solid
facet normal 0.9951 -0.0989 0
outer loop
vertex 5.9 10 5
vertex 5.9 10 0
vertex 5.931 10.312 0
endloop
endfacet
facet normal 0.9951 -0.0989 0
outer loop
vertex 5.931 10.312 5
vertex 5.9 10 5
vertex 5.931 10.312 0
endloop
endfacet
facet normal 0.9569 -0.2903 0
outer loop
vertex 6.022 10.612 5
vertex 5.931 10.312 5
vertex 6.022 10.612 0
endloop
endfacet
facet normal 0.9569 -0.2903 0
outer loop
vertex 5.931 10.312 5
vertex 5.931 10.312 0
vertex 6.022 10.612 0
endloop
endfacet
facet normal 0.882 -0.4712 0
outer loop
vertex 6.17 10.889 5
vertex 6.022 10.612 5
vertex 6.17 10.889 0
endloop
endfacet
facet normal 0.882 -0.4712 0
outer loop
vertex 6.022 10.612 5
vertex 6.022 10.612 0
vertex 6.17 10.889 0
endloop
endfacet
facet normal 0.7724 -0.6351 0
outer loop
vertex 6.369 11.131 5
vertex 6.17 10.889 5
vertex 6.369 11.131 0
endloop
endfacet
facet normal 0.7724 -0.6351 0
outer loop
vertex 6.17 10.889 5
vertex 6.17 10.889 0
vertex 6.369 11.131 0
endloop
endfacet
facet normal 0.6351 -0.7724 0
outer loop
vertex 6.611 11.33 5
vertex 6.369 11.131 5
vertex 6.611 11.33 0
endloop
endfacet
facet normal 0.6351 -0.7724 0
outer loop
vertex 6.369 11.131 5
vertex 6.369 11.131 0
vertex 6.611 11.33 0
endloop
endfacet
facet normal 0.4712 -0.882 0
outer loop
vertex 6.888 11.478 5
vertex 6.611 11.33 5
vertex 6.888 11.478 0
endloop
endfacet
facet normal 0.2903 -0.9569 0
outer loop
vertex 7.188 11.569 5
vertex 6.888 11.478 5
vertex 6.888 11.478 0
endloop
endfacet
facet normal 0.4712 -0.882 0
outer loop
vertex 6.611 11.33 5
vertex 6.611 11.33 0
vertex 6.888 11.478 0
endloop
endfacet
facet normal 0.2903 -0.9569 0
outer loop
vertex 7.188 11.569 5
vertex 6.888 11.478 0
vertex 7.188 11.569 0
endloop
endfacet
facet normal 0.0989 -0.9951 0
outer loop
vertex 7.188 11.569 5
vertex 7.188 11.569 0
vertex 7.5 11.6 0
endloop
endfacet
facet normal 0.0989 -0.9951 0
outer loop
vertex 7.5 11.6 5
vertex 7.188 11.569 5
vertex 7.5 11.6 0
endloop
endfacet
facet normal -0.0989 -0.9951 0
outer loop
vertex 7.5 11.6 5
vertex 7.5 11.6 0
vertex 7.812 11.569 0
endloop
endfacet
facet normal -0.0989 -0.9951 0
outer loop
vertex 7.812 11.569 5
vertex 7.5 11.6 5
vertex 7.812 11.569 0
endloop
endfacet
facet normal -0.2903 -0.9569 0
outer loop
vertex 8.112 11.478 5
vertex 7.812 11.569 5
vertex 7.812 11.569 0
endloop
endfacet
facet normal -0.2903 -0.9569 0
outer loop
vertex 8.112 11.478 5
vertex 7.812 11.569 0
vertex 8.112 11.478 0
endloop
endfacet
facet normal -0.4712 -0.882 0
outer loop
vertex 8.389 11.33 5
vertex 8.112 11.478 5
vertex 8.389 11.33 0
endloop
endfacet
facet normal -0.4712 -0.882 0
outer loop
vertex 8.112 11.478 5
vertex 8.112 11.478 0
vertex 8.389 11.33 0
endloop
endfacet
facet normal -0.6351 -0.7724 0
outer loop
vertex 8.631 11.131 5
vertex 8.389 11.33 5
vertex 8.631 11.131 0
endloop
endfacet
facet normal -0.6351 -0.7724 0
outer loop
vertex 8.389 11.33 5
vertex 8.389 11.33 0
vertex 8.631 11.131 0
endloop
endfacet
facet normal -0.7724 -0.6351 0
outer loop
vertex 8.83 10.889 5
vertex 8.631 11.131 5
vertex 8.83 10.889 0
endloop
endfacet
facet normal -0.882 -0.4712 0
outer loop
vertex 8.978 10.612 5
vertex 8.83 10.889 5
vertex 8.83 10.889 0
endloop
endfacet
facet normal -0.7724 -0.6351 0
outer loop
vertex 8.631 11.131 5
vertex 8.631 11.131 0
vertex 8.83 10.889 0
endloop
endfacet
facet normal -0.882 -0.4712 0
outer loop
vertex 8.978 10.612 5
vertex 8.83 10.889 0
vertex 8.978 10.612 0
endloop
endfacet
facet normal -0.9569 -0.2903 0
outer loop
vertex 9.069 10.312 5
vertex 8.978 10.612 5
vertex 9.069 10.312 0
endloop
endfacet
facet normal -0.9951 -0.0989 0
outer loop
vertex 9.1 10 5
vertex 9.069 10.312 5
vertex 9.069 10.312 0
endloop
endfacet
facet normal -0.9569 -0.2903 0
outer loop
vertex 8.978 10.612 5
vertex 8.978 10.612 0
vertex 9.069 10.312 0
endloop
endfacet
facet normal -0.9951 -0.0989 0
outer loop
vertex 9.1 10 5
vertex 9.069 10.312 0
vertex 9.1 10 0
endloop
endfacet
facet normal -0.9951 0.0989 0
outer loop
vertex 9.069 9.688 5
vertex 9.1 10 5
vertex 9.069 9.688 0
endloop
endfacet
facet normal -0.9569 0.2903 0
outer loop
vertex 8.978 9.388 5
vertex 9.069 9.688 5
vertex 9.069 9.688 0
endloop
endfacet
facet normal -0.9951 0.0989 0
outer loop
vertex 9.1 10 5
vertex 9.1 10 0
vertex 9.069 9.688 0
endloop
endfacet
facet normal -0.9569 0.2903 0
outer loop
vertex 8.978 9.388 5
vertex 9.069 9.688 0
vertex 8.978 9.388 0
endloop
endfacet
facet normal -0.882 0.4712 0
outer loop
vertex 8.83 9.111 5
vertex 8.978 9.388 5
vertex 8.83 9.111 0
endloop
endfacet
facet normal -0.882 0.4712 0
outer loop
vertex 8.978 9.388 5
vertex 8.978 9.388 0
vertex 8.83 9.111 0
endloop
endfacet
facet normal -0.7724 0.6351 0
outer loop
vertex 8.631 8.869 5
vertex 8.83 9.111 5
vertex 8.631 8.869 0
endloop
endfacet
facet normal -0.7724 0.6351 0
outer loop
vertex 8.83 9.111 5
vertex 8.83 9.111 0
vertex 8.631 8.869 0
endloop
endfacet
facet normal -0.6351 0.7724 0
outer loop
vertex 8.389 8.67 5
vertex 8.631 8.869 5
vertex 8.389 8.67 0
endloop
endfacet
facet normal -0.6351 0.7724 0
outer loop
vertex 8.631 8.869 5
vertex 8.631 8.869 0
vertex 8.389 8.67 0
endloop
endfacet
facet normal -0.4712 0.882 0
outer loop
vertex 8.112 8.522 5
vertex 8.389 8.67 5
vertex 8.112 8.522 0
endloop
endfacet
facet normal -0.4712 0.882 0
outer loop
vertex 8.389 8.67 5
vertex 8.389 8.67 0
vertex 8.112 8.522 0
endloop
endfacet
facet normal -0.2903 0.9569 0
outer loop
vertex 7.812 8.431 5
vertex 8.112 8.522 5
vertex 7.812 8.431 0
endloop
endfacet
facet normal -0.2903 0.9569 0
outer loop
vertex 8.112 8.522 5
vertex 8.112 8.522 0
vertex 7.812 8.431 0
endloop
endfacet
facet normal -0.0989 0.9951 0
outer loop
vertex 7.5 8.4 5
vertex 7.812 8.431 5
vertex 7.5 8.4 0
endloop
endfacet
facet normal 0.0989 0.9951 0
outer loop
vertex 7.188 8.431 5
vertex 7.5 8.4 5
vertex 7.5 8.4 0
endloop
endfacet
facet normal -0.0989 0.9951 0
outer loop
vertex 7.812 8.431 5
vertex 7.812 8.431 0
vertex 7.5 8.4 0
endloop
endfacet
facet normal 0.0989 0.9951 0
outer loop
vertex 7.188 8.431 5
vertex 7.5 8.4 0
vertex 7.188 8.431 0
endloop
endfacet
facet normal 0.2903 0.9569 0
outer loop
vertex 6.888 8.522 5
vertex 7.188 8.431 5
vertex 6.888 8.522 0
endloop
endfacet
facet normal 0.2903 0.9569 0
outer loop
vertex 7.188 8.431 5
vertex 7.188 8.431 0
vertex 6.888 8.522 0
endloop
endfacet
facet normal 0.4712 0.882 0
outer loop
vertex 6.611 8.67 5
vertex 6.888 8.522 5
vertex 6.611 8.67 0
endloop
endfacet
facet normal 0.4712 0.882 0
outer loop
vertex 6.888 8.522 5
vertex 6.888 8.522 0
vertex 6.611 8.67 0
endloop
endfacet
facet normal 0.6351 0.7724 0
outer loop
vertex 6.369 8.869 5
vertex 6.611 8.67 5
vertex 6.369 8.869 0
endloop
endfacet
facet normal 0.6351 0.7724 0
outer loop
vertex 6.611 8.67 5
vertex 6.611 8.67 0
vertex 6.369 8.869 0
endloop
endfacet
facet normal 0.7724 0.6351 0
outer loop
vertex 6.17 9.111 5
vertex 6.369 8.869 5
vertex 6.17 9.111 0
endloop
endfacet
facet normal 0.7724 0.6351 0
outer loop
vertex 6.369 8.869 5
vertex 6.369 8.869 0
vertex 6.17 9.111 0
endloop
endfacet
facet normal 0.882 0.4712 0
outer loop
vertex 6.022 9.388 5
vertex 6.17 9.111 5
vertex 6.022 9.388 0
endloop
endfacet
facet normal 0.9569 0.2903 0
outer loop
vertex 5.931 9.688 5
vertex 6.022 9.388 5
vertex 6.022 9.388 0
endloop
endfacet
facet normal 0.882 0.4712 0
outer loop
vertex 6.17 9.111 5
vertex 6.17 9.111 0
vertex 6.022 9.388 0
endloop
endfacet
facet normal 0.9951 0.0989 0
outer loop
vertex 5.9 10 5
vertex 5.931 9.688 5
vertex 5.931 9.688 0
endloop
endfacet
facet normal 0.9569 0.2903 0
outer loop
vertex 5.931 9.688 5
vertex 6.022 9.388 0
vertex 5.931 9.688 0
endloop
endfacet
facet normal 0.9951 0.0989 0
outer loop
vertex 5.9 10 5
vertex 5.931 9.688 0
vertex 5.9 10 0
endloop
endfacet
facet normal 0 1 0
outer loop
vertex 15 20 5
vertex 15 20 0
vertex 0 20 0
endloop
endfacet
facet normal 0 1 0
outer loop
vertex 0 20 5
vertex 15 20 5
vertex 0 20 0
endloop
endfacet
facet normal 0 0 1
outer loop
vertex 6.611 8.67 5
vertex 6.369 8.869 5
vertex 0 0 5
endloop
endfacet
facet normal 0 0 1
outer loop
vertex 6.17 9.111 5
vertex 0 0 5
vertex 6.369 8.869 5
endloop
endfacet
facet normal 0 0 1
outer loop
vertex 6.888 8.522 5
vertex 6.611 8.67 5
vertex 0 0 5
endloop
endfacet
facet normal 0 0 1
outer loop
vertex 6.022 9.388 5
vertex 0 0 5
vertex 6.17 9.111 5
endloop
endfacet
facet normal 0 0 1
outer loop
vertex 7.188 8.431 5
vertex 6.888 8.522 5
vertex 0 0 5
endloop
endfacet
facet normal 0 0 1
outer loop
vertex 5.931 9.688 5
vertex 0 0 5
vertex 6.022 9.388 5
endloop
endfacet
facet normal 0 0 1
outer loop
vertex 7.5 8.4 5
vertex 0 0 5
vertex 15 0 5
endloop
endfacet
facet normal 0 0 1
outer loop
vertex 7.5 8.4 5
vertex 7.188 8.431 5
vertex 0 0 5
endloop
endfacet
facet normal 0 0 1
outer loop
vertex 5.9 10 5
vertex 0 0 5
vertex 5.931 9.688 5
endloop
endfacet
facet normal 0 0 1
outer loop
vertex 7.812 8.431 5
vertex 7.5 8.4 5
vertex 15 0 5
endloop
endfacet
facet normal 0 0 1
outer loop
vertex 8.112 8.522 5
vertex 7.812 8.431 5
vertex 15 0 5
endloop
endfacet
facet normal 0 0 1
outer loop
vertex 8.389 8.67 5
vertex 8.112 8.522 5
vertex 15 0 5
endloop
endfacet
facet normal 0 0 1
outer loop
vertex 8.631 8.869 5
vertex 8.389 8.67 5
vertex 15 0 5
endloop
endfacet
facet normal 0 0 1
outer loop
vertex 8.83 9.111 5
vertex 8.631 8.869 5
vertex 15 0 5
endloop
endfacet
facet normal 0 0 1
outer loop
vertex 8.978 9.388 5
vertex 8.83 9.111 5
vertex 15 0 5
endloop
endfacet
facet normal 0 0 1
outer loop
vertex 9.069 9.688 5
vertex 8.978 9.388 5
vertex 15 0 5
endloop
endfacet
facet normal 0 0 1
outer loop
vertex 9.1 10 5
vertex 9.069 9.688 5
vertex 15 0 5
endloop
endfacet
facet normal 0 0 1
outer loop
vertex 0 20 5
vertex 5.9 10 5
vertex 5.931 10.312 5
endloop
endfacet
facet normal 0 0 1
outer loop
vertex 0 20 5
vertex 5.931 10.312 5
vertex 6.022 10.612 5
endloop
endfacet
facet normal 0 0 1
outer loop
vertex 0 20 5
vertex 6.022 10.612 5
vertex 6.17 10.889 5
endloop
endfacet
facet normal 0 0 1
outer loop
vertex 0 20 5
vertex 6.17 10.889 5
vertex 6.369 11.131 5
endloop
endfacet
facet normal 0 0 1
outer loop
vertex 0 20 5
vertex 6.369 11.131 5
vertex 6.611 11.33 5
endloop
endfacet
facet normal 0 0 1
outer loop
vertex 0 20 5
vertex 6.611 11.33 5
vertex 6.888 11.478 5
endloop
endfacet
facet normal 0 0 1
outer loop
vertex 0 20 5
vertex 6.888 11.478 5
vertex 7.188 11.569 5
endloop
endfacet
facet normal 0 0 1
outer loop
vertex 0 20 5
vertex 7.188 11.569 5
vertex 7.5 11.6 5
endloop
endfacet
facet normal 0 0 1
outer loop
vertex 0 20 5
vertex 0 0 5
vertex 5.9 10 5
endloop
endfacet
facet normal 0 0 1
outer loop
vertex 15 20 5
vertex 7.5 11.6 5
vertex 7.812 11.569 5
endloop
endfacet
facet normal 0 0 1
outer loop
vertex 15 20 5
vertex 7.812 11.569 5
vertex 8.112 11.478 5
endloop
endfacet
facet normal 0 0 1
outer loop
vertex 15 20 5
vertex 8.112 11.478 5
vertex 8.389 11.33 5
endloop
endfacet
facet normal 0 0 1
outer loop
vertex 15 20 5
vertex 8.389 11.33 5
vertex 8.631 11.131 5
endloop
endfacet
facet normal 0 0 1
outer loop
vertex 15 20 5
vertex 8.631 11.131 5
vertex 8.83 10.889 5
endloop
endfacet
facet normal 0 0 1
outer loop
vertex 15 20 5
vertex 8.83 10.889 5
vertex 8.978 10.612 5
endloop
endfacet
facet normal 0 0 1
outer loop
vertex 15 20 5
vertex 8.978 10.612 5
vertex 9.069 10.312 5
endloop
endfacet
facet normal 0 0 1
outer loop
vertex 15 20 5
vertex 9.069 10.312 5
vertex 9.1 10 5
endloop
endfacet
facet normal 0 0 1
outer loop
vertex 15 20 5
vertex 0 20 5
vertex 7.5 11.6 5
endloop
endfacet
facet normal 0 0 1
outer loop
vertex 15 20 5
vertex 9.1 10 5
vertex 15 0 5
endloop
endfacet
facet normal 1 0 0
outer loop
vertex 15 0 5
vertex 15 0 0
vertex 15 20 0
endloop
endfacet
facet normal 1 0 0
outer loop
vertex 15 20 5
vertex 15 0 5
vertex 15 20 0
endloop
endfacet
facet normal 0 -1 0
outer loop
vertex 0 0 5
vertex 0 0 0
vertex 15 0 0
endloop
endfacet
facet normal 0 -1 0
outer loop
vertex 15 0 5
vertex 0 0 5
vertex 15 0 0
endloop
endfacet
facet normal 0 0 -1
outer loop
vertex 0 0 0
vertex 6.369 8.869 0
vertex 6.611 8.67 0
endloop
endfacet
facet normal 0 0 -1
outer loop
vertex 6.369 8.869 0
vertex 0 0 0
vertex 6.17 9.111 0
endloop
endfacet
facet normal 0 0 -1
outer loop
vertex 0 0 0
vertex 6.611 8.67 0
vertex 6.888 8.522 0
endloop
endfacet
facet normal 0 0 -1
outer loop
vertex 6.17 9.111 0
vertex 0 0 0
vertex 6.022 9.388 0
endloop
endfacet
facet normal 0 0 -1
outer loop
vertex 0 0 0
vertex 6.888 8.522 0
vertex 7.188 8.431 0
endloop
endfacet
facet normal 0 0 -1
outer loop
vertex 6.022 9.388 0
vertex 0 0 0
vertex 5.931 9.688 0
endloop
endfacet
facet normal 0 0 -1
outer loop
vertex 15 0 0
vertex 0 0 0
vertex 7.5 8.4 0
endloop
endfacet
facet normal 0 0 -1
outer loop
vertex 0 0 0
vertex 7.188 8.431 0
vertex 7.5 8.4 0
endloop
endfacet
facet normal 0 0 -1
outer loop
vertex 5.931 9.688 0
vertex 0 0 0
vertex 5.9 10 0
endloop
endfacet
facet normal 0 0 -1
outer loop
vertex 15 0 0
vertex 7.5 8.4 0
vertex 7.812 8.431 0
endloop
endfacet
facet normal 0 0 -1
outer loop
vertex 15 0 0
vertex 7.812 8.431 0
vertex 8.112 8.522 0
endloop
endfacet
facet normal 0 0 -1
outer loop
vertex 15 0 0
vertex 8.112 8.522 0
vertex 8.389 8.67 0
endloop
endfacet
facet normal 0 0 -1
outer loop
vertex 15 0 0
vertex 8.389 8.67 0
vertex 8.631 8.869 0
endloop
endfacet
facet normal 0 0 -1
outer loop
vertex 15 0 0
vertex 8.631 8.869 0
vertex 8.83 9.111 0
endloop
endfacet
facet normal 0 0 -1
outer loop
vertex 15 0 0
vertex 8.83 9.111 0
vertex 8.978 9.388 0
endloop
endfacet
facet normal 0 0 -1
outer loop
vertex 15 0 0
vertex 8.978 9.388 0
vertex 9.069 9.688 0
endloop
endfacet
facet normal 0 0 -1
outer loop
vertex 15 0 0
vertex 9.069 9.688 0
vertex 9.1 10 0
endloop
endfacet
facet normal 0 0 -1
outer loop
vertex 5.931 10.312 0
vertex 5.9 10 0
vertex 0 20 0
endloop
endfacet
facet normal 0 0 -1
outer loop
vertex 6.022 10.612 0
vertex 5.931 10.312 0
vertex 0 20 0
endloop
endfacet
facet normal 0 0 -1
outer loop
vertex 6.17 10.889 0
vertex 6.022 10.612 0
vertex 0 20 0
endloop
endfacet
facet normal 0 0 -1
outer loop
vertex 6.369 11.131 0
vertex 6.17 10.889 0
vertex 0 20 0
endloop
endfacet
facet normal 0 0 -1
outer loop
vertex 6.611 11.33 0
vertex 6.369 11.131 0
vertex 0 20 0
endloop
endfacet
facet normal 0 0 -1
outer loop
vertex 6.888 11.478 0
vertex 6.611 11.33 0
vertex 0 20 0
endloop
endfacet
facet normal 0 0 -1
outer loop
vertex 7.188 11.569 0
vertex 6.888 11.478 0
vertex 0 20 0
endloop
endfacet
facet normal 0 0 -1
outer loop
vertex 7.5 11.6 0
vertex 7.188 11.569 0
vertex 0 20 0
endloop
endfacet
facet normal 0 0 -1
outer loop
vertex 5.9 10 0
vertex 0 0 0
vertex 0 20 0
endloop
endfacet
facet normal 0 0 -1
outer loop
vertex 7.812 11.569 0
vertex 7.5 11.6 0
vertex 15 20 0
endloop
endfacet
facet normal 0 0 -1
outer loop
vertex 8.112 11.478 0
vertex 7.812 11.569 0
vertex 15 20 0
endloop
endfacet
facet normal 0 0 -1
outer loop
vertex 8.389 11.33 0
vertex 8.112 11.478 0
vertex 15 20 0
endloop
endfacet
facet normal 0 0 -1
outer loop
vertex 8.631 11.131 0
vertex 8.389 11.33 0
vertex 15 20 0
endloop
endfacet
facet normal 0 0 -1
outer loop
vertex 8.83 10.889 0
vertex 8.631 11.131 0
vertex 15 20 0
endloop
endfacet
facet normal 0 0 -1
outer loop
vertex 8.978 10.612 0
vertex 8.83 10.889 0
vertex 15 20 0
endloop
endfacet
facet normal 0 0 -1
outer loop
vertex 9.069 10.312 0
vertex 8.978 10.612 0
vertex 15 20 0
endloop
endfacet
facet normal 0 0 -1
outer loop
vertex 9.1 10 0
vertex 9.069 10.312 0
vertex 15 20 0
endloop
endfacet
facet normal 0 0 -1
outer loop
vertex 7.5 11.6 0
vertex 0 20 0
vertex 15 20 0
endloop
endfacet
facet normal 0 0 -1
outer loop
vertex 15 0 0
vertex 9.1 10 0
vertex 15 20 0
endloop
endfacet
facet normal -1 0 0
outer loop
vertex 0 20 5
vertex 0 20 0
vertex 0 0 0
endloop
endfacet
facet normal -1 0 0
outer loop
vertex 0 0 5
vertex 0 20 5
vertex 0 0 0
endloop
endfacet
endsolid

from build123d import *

# Parameters (mm, degrees)
F1_DEPTH = 5


with BuildPart() as f1:
    # F0 (on Top) → F1 (new body)
    with BuildSketch(Plane.XY):
        with BuildLine():
            Line((0, 10), (0, 0))
            Line((0, 0), (15, 0))
            Line((15, 0), (15, 10))
            Line((15, 10), (9.1, 10))
            ThreePointArc((9.1, 10), (7.5, 8.4), (5.9, 10))
            Line((5.9, 10), (0, 10))
        make_face()
        with BuildLine():
            Line((0, 20), (0, 10))
            Line((0, 10), (5.9, 10))
            ThreePointArc((5.9, 10), (7.5, 11.6), (9.1, 10))
            Line((9.1, 10), (15, 10))
            Line((15, 10), (15, 20))
            Line((15, 20), (0, 20))
        make_face()
    extrude(amount=F1_DEPTH)


solid = f1.part
